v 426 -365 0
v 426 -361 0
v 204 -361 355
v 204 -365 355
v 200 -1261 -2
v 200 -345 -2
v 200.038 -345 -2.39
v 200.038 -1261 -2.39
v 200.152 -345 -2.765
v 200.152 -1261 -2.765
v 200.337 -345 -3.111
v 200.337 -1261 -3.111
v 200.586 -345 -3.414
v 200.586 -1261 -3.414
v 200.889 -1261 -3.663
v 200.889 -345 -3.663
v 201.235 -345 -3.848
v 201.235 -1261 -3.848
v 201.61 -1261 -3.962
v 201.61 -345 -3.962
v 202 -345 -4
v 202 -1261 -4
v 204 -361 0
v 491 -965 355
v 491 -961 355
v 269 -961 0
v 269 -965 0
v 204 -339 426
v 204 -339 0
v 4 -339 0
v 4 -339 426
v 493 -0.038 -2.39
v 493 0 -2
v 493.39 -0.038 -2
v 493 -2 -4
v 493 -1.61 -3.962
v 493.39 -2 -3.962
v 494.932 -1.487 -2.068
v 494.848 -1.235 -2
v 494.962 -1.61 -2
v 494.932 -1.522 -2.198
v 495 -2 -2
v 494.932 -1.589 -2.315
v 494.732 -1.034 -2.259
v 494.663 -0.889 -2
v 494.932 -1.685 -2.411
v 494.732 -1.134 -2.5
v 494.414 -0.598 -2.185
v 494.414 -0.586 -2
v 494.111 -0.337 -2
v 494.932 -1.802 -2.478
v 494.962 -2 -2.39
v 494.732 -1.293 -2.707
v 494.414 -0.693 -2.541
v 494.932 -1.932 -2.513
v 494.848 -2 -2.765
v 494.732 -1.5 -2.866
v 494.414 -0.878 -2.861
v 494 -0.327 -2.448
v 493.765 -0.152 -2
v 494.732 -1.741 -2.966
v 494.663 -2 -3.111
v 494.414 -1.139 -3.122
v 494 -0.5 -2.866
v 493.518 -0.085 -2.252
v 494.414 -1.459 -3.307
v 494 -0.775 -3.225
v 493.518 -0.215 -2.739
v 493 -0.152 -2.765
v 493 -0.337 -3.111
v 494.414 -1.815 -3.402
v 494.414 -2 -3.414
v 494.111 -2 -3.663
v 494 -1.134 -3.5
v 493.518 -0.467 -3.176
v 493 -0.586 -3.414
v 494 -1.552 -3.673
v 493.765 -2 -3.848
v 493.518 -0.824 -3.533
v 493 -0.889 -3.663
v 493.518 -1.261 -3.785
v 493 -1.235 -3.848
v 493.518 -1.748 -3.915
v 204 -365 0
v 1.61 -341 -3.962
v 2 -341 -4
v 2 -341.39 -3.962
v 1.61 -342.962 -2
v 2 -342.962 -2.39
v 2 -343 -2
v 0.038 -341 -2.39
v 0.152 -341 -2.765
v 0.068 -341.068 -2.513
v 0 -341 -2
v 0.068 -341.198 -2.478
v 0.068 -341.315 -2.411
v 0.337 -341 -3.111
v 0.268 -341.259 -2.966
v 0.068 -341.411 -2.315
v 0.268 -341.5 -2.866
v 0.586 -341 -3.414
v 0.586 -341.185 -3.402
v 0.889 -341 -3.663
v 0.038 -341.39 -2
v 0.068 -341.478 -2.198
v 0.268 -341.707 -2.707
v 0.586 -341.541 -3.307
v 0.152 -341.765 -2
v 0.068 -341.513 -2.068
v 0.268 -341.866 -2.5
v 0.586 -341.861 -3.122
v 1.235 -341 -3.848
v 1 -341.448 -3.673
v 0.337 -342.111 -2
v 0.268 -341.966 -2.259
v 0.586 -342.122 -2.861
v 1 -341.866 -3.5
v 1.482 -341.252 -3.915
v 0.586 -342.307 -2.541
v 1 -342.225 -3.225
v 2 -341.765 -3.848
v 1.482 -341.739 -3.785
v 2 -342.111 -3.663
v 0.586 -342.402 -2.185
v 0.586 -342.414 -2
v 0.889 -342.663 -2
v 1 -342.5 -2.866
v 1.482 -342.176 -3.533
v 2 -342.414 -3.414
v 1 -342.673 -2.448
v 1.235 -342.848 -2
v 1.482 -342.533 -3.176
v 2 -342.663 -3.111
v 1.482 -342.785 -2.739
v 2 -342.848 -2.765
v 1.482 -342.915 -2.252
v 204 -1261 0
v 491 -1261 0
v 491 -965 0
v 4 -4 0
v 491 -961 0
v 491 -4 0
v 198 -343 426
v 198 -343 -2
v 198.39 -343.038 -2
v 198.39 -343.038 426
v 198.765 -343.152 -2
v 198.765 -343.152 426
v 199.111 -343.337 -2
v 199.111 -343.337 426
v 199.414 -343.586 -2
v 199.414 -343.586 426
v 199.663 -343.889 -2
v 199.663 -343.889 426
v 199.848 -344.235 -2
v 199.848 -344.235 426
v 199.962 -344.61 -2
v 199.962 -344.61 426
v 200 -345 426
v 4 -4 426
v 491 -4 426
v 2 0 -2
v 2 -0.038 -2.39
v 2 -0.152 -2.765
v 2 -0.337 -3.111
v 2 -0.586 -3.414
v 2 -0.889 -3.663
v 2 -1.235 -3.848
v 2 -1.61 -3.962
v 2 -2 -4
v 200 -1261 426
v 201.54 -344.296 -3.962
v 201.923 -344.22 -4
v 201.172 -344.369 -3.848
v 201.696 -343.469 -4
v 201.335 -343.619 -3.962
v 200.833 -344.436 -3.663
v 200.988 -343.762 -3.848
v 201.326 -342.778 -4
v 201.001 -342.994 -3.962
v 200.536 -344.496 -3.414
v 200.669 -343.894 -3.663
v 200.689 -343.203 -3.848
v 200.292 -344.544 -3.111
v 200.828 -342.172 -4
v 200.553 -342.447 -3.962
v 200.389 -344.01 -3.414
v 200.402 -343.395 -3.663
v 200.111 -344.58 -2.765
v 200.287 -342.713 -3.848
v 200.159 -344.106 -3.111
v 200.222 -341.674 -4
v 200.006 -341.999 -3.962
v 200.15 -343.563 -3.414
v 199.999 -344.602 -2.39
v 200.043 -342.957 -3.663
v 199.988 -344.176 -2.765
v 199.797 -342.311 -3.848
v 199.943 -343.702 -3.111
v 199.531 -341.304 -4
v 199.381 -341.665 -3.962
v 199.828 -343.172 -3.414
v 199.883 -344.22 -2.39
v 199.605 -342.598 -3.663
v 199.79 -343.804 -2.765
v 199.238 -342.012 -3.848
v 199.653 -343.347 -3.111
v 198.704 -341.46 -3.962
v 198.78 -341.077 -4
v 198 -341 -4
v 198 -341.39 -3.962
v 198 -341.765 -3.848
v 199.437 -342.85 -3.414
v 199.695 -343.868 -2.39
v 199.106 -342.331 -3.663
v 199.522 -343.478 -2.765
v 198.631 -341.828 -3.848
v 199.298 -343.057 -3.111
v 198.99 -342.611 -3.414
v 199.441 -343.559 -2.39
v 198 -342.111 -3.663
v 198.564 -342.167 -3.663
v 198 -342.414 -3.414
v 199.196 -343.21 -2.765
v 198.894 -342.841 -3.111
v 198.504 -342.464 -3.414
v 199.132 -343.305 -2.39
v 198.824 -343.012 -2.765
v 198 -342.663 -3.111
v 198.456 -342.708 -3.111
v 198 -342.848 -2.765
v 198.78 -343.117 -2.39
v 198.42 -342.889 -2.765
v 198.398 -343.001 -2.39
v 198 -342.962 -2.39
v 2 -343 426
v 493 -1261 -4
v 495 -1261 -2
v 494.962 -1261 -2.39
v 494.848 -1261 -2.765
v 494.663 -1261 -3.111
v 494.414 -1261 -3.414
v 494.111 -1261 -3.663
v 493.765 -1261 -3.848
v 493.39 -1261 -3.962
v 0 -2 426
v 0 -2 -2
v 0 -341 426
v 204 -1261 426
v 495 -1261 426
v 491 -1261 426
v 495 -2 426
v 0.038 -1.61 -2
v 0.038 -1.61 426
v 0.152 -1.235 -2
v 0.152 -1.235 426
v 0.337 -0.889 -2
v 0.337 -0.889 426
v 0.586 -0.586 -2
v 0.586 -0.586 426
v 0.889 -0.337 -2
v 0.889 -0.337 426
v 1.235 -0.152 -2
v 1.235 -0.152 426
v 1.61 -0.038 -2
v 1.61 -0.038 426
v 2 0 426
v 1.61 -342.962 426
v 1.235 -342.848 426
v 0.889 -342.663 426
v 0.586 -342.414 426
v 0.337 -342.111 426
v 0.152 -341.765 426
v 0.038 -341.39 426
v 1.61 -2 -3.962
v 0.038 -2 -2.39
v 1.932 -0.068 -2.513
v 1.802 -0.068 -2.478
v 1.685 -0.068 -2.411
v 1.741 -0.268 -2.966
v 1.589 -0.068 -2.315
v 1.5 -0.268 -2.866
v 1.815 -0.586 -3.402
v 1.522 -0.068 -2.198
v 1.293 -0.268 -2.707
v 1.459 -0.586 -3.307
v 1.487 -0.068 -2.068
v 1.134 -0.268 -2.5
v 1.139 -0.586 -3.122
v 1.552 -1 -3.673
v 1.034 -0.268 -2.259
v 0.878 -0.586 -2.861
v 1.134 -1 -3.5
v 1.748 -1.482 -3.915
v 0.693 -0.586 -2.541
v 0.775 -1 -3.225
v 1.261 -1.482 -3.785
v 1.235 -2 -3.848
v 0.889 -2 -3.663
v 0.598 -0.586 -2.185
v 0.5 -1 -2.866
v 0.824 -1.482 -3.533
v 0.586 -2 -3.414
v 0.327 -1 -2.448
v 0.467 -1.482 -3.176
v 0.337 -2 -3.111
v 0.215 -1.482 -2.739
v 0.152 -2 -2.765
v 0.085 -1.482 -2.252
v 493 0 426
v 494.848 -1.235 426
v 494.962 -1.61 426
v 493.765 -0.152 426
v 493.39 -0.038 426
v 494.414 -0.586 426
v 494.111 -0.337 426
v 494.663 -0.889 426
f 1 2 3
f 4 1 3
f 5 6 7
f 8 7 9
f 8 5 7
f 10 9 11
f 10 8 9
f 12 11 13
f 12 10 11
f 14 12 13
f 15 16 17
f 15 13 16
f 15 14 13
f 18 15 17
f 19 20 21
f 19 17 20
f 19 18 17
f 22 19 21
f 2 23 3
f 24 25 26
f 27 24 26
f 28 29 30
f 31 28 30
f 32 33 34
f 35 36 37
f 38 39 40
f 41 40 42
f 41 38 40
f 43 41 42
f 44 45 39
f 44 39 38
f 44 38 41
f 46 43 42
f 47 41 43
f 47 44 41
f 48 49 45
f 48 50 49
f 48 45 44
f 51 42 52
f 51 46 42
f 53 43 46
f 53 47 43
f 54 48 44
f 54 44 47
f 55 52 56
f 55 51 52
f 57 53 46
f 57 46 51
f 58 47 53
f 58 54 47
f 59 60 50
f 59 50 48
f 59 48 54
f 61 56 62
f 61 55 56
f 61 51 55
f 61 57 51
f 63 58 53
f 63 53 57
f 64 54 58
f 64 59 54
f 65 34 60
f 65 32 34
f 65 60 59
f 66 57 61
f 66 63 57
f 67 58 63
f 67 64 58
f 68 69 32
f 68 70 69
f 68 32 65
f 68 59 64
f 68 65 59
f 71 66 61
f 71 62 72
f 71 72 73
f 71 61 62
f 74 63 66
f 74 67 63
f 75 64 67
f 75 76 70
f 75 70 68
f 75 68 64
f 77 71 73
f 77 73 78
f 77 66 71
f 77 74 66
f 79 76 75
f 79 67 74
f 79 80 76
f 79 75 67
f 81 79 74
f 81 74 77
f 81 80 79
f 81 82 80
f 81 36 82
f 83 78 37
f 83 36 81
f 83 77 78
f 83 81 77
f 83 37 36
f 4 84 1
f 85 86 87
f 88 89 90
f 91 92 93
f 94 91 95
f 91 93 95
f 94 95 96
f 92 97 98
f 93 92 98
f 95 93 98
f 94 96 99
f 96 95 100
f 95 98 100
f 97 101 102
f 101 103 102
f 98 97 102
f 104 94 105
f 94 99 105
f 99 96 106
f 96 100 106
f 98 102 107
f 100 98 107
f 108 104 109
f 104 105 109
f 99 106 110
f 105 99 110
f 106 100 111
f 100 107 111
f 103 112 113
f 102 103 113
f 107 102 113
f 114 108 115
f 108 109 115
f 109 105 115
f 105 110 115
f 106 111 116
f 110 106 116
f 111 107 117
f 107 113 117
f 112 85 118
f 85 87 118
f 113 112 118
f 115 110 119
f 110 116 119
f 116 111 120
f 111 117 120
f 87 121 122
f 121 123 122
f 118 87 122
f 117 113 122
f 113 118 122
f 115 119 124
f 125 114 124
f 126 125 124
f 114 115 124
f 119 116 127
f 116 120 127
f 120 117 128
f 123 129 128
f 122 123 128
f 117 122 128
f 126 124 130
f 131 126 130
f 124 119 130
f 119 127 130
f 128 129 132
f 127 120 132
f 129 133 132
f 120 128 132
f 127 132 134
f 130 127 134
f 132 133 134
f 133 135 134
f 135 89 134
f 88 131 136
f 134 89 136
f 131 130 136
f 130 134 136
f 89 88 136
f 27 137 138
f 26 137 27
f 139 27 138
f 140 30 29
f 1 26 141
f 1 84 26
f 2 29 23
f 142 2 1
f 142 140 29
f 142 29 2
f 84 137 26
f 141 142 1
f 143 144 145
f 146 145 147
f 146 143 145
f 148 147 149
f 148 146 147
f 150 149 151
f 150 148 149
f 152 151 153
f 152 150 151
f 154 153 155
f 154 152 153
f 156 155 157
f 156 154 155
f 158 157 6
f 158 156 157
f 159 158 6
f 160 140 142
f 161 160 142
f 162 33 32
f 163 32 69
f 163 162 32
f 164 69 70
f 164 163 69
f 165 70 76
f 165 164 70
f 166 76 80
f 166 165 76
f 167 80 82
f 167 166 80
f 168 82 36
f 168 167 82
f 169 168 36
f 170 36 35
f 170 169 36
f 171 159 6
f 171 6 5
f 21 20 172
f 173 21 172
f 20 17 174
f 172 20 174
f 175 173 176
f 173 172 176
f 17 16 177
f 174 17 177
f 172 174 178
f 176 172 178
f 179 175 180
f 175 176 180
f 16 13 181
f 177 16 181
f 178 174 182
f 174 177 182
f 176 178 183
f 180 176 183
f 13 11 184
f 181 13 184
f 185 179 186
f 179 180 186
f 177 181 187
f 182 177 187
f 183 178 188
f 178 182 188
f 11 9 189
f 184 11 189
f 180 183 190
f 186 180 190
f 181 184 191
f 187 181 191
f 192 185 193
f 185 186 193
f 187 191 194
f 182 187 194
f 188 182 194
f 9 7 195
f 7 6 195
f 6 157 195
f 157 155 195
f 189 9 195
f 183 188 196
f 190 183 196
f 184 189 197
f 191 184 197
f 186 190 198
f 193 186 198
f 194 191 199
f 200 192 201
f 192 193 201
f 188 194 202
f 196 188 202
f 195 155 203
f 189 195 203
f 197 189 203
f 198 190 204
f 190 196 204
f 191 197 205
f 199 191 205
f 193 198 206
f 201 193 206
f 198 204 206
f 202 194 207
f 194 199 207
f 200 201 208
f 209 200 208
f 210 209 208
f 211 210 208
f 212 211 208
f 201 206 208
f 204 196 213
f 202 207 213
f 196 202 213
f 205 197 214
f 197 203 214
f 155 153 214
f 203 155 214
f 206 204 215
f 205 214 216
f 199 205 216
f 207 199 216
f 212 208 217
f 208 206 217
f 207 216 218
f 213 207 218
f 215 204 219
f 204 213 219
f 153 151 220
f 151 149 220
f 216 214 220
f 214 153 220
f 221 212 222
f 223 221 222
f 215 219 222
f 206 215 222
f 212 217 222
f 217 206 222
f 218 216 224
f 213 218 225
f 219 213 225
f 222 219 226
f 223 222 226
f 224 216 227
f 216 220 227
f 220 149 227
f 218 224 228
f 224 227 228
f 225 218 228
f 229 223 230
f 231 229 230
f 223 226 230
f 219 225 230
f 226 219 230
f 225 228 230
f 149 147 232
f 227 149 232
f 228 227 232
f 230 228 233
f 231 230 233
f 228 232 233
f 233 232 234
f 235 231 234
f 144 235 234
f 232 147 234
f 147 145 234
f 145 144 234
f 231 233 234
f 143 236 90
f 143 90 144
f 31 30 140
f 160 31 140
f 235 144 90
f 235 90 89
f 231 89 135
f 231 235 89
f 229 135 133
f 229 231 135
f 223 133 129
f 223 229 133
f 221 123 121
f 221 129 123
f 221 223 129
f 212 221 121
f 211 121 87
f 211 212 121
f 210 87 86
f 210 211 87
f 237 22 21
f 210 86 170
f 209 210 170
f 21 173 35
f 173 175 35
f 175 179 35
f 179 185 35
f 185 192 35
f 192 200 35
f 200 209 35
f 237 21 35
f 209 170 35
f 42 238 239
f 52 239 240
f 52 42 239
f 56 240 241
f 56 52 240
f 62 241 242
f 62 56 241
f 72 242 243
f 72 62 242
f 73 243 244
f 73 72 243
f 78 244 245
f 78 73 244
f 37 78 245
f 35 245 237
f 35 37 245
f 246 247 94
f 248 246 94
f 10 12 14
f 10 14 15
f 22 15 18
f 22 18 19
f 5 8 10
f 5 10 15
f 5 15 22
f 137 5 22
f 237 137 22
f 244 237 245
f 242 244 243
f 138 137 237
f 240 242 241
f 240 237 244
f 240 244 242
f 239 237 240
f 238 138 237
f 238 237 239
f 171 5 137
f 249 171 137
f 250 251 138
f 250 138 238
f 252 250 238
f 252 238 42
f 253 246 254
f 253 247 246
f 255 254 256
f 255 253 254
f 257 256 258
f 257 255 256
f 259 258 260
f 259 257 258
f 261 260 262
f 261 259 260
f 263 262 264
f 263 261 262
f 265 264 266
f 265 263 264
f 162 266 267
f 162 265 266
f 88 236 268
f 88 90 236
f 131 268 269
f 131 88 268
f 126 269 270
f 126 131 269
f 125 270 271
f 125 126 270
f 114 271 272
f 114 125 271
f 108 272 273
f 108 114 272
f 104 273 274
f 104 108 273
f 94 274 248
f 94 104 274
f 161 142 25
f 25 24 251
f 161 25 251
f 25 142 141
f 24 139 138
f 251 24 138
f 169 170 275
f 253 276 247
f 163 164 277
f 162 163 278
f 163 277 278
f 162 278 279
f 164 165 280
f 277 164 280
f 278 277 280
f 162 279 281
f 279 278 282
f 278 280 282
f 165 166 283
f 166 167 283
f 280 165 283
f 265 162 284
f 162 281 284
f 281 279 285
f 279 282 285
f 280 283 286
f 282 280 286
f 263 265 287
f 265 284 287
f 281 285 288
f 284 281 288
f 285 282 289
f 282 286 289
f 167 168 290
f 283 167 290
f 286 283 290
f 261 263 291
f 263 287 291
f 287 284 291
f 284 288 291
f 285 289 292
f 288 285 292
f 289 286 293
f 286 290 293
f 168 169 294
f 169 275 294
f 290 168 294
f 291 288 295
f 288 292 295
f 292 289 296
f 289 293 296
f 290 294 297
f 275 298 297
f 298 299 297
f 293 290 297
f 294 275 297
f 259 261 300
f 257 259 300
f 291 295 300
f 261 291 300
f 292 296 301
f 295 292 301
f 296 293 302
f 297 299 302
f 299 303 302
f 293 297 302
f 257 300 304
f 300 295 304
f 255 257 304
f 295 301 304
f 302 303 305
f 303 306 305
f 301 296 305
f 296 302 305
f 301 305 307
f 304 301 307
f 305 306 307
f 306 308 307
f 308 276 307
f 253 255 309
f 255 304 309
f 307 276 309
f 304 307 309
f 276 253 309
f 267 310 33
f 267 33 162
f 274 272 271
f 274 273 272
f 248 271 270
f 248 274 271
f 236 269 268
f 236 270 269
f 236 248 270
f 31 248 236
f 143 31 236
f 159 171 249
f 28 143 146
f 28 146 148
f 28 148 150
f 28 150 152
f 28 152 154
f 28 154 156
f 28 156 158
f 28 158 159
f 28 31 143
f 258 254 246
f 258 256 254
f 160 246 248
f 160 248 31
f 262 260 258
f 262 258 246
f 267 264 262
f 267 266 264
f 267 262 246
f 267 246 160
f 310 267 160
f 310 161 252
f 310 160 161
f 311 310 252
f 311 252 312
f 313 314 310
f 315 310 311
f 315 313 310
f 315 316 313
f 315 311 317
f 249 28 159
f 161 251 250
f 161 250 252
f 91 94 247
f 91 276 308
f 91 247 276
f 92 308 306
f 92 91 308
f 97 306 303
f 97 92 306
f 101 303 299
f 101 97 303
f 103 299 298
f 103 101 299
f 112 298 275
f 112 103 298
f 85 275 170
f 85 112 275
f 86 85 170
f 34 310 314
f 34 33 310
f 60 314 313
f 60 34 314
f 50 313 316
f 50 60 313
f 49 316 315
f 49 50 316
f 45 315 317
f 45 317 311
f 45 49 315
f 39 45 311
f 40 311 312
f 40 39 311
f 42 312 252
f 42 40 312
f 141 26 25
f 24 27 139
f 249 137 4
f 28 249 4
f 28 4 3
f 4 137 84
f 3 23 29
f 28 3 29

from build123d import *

# Parameters (mm, degrees)
F1_DEPTH  = 426
F3_DEPTH  = 4
F4_R      = 2
F7_DEPTH  = 4
F10_DEPTH = 4


# Not quite as in the source:
# - a feature names something its author has since deleted; it is built from what else it names


with BuildPart() as f1:
    # F0 (on Top) → F1 (new body)
    with BuildSketch(Plane.XY):
        Polygon((495, 0), (0, 0), (0, -343), (200, -343), (200, -1261), (204, -1261), (204, -339), (4, -339), (4, -4), (491, -4), (491, -1261), (495, -1261), align=None)
    extrude(amount=F1_DEPTH)

    # F2 (on Top) → F3 (join)
    with BuildSketch(Plane.XY):
        Polygon((0, -343), (200, -343), (200, -1261), (495, -1261), (495, 0), (0, 0), align=None)
    extrude(amount=-F3_DEPTH)

    # F4
    f4_edges = [f1.edges().sort_by_distance(p)[0] for p in [
        (100, -343, -4),
        (0, -171.5, -4),
        (247.5, 0, -4),
        (200, -343, 211),
        (0, -343, 211),
        (0, 0, 211),
        (495, 0, 211),
        (200, -802, -4),
        (495, -630.5, -4),
    ]]
    fillet(f4_edges, radius=F4_R)

    # F6 (on offset) → F7 (join)
    with BuildSketch(Plane.XZ.offset(961)):
        Polygon((269, 0), (491, 0), (491, 355), align=None)
    extrude(amount=F7_DEPTH)

    # F9 (on offset) → F10 (join)
    with BuildSketch(Plane.XZ.offset(361)):
        Polygon((204, 355), (204, 0), (426, 0), align=None)
    extrude(amount=F10_DEPTH)


solid = f1.part
